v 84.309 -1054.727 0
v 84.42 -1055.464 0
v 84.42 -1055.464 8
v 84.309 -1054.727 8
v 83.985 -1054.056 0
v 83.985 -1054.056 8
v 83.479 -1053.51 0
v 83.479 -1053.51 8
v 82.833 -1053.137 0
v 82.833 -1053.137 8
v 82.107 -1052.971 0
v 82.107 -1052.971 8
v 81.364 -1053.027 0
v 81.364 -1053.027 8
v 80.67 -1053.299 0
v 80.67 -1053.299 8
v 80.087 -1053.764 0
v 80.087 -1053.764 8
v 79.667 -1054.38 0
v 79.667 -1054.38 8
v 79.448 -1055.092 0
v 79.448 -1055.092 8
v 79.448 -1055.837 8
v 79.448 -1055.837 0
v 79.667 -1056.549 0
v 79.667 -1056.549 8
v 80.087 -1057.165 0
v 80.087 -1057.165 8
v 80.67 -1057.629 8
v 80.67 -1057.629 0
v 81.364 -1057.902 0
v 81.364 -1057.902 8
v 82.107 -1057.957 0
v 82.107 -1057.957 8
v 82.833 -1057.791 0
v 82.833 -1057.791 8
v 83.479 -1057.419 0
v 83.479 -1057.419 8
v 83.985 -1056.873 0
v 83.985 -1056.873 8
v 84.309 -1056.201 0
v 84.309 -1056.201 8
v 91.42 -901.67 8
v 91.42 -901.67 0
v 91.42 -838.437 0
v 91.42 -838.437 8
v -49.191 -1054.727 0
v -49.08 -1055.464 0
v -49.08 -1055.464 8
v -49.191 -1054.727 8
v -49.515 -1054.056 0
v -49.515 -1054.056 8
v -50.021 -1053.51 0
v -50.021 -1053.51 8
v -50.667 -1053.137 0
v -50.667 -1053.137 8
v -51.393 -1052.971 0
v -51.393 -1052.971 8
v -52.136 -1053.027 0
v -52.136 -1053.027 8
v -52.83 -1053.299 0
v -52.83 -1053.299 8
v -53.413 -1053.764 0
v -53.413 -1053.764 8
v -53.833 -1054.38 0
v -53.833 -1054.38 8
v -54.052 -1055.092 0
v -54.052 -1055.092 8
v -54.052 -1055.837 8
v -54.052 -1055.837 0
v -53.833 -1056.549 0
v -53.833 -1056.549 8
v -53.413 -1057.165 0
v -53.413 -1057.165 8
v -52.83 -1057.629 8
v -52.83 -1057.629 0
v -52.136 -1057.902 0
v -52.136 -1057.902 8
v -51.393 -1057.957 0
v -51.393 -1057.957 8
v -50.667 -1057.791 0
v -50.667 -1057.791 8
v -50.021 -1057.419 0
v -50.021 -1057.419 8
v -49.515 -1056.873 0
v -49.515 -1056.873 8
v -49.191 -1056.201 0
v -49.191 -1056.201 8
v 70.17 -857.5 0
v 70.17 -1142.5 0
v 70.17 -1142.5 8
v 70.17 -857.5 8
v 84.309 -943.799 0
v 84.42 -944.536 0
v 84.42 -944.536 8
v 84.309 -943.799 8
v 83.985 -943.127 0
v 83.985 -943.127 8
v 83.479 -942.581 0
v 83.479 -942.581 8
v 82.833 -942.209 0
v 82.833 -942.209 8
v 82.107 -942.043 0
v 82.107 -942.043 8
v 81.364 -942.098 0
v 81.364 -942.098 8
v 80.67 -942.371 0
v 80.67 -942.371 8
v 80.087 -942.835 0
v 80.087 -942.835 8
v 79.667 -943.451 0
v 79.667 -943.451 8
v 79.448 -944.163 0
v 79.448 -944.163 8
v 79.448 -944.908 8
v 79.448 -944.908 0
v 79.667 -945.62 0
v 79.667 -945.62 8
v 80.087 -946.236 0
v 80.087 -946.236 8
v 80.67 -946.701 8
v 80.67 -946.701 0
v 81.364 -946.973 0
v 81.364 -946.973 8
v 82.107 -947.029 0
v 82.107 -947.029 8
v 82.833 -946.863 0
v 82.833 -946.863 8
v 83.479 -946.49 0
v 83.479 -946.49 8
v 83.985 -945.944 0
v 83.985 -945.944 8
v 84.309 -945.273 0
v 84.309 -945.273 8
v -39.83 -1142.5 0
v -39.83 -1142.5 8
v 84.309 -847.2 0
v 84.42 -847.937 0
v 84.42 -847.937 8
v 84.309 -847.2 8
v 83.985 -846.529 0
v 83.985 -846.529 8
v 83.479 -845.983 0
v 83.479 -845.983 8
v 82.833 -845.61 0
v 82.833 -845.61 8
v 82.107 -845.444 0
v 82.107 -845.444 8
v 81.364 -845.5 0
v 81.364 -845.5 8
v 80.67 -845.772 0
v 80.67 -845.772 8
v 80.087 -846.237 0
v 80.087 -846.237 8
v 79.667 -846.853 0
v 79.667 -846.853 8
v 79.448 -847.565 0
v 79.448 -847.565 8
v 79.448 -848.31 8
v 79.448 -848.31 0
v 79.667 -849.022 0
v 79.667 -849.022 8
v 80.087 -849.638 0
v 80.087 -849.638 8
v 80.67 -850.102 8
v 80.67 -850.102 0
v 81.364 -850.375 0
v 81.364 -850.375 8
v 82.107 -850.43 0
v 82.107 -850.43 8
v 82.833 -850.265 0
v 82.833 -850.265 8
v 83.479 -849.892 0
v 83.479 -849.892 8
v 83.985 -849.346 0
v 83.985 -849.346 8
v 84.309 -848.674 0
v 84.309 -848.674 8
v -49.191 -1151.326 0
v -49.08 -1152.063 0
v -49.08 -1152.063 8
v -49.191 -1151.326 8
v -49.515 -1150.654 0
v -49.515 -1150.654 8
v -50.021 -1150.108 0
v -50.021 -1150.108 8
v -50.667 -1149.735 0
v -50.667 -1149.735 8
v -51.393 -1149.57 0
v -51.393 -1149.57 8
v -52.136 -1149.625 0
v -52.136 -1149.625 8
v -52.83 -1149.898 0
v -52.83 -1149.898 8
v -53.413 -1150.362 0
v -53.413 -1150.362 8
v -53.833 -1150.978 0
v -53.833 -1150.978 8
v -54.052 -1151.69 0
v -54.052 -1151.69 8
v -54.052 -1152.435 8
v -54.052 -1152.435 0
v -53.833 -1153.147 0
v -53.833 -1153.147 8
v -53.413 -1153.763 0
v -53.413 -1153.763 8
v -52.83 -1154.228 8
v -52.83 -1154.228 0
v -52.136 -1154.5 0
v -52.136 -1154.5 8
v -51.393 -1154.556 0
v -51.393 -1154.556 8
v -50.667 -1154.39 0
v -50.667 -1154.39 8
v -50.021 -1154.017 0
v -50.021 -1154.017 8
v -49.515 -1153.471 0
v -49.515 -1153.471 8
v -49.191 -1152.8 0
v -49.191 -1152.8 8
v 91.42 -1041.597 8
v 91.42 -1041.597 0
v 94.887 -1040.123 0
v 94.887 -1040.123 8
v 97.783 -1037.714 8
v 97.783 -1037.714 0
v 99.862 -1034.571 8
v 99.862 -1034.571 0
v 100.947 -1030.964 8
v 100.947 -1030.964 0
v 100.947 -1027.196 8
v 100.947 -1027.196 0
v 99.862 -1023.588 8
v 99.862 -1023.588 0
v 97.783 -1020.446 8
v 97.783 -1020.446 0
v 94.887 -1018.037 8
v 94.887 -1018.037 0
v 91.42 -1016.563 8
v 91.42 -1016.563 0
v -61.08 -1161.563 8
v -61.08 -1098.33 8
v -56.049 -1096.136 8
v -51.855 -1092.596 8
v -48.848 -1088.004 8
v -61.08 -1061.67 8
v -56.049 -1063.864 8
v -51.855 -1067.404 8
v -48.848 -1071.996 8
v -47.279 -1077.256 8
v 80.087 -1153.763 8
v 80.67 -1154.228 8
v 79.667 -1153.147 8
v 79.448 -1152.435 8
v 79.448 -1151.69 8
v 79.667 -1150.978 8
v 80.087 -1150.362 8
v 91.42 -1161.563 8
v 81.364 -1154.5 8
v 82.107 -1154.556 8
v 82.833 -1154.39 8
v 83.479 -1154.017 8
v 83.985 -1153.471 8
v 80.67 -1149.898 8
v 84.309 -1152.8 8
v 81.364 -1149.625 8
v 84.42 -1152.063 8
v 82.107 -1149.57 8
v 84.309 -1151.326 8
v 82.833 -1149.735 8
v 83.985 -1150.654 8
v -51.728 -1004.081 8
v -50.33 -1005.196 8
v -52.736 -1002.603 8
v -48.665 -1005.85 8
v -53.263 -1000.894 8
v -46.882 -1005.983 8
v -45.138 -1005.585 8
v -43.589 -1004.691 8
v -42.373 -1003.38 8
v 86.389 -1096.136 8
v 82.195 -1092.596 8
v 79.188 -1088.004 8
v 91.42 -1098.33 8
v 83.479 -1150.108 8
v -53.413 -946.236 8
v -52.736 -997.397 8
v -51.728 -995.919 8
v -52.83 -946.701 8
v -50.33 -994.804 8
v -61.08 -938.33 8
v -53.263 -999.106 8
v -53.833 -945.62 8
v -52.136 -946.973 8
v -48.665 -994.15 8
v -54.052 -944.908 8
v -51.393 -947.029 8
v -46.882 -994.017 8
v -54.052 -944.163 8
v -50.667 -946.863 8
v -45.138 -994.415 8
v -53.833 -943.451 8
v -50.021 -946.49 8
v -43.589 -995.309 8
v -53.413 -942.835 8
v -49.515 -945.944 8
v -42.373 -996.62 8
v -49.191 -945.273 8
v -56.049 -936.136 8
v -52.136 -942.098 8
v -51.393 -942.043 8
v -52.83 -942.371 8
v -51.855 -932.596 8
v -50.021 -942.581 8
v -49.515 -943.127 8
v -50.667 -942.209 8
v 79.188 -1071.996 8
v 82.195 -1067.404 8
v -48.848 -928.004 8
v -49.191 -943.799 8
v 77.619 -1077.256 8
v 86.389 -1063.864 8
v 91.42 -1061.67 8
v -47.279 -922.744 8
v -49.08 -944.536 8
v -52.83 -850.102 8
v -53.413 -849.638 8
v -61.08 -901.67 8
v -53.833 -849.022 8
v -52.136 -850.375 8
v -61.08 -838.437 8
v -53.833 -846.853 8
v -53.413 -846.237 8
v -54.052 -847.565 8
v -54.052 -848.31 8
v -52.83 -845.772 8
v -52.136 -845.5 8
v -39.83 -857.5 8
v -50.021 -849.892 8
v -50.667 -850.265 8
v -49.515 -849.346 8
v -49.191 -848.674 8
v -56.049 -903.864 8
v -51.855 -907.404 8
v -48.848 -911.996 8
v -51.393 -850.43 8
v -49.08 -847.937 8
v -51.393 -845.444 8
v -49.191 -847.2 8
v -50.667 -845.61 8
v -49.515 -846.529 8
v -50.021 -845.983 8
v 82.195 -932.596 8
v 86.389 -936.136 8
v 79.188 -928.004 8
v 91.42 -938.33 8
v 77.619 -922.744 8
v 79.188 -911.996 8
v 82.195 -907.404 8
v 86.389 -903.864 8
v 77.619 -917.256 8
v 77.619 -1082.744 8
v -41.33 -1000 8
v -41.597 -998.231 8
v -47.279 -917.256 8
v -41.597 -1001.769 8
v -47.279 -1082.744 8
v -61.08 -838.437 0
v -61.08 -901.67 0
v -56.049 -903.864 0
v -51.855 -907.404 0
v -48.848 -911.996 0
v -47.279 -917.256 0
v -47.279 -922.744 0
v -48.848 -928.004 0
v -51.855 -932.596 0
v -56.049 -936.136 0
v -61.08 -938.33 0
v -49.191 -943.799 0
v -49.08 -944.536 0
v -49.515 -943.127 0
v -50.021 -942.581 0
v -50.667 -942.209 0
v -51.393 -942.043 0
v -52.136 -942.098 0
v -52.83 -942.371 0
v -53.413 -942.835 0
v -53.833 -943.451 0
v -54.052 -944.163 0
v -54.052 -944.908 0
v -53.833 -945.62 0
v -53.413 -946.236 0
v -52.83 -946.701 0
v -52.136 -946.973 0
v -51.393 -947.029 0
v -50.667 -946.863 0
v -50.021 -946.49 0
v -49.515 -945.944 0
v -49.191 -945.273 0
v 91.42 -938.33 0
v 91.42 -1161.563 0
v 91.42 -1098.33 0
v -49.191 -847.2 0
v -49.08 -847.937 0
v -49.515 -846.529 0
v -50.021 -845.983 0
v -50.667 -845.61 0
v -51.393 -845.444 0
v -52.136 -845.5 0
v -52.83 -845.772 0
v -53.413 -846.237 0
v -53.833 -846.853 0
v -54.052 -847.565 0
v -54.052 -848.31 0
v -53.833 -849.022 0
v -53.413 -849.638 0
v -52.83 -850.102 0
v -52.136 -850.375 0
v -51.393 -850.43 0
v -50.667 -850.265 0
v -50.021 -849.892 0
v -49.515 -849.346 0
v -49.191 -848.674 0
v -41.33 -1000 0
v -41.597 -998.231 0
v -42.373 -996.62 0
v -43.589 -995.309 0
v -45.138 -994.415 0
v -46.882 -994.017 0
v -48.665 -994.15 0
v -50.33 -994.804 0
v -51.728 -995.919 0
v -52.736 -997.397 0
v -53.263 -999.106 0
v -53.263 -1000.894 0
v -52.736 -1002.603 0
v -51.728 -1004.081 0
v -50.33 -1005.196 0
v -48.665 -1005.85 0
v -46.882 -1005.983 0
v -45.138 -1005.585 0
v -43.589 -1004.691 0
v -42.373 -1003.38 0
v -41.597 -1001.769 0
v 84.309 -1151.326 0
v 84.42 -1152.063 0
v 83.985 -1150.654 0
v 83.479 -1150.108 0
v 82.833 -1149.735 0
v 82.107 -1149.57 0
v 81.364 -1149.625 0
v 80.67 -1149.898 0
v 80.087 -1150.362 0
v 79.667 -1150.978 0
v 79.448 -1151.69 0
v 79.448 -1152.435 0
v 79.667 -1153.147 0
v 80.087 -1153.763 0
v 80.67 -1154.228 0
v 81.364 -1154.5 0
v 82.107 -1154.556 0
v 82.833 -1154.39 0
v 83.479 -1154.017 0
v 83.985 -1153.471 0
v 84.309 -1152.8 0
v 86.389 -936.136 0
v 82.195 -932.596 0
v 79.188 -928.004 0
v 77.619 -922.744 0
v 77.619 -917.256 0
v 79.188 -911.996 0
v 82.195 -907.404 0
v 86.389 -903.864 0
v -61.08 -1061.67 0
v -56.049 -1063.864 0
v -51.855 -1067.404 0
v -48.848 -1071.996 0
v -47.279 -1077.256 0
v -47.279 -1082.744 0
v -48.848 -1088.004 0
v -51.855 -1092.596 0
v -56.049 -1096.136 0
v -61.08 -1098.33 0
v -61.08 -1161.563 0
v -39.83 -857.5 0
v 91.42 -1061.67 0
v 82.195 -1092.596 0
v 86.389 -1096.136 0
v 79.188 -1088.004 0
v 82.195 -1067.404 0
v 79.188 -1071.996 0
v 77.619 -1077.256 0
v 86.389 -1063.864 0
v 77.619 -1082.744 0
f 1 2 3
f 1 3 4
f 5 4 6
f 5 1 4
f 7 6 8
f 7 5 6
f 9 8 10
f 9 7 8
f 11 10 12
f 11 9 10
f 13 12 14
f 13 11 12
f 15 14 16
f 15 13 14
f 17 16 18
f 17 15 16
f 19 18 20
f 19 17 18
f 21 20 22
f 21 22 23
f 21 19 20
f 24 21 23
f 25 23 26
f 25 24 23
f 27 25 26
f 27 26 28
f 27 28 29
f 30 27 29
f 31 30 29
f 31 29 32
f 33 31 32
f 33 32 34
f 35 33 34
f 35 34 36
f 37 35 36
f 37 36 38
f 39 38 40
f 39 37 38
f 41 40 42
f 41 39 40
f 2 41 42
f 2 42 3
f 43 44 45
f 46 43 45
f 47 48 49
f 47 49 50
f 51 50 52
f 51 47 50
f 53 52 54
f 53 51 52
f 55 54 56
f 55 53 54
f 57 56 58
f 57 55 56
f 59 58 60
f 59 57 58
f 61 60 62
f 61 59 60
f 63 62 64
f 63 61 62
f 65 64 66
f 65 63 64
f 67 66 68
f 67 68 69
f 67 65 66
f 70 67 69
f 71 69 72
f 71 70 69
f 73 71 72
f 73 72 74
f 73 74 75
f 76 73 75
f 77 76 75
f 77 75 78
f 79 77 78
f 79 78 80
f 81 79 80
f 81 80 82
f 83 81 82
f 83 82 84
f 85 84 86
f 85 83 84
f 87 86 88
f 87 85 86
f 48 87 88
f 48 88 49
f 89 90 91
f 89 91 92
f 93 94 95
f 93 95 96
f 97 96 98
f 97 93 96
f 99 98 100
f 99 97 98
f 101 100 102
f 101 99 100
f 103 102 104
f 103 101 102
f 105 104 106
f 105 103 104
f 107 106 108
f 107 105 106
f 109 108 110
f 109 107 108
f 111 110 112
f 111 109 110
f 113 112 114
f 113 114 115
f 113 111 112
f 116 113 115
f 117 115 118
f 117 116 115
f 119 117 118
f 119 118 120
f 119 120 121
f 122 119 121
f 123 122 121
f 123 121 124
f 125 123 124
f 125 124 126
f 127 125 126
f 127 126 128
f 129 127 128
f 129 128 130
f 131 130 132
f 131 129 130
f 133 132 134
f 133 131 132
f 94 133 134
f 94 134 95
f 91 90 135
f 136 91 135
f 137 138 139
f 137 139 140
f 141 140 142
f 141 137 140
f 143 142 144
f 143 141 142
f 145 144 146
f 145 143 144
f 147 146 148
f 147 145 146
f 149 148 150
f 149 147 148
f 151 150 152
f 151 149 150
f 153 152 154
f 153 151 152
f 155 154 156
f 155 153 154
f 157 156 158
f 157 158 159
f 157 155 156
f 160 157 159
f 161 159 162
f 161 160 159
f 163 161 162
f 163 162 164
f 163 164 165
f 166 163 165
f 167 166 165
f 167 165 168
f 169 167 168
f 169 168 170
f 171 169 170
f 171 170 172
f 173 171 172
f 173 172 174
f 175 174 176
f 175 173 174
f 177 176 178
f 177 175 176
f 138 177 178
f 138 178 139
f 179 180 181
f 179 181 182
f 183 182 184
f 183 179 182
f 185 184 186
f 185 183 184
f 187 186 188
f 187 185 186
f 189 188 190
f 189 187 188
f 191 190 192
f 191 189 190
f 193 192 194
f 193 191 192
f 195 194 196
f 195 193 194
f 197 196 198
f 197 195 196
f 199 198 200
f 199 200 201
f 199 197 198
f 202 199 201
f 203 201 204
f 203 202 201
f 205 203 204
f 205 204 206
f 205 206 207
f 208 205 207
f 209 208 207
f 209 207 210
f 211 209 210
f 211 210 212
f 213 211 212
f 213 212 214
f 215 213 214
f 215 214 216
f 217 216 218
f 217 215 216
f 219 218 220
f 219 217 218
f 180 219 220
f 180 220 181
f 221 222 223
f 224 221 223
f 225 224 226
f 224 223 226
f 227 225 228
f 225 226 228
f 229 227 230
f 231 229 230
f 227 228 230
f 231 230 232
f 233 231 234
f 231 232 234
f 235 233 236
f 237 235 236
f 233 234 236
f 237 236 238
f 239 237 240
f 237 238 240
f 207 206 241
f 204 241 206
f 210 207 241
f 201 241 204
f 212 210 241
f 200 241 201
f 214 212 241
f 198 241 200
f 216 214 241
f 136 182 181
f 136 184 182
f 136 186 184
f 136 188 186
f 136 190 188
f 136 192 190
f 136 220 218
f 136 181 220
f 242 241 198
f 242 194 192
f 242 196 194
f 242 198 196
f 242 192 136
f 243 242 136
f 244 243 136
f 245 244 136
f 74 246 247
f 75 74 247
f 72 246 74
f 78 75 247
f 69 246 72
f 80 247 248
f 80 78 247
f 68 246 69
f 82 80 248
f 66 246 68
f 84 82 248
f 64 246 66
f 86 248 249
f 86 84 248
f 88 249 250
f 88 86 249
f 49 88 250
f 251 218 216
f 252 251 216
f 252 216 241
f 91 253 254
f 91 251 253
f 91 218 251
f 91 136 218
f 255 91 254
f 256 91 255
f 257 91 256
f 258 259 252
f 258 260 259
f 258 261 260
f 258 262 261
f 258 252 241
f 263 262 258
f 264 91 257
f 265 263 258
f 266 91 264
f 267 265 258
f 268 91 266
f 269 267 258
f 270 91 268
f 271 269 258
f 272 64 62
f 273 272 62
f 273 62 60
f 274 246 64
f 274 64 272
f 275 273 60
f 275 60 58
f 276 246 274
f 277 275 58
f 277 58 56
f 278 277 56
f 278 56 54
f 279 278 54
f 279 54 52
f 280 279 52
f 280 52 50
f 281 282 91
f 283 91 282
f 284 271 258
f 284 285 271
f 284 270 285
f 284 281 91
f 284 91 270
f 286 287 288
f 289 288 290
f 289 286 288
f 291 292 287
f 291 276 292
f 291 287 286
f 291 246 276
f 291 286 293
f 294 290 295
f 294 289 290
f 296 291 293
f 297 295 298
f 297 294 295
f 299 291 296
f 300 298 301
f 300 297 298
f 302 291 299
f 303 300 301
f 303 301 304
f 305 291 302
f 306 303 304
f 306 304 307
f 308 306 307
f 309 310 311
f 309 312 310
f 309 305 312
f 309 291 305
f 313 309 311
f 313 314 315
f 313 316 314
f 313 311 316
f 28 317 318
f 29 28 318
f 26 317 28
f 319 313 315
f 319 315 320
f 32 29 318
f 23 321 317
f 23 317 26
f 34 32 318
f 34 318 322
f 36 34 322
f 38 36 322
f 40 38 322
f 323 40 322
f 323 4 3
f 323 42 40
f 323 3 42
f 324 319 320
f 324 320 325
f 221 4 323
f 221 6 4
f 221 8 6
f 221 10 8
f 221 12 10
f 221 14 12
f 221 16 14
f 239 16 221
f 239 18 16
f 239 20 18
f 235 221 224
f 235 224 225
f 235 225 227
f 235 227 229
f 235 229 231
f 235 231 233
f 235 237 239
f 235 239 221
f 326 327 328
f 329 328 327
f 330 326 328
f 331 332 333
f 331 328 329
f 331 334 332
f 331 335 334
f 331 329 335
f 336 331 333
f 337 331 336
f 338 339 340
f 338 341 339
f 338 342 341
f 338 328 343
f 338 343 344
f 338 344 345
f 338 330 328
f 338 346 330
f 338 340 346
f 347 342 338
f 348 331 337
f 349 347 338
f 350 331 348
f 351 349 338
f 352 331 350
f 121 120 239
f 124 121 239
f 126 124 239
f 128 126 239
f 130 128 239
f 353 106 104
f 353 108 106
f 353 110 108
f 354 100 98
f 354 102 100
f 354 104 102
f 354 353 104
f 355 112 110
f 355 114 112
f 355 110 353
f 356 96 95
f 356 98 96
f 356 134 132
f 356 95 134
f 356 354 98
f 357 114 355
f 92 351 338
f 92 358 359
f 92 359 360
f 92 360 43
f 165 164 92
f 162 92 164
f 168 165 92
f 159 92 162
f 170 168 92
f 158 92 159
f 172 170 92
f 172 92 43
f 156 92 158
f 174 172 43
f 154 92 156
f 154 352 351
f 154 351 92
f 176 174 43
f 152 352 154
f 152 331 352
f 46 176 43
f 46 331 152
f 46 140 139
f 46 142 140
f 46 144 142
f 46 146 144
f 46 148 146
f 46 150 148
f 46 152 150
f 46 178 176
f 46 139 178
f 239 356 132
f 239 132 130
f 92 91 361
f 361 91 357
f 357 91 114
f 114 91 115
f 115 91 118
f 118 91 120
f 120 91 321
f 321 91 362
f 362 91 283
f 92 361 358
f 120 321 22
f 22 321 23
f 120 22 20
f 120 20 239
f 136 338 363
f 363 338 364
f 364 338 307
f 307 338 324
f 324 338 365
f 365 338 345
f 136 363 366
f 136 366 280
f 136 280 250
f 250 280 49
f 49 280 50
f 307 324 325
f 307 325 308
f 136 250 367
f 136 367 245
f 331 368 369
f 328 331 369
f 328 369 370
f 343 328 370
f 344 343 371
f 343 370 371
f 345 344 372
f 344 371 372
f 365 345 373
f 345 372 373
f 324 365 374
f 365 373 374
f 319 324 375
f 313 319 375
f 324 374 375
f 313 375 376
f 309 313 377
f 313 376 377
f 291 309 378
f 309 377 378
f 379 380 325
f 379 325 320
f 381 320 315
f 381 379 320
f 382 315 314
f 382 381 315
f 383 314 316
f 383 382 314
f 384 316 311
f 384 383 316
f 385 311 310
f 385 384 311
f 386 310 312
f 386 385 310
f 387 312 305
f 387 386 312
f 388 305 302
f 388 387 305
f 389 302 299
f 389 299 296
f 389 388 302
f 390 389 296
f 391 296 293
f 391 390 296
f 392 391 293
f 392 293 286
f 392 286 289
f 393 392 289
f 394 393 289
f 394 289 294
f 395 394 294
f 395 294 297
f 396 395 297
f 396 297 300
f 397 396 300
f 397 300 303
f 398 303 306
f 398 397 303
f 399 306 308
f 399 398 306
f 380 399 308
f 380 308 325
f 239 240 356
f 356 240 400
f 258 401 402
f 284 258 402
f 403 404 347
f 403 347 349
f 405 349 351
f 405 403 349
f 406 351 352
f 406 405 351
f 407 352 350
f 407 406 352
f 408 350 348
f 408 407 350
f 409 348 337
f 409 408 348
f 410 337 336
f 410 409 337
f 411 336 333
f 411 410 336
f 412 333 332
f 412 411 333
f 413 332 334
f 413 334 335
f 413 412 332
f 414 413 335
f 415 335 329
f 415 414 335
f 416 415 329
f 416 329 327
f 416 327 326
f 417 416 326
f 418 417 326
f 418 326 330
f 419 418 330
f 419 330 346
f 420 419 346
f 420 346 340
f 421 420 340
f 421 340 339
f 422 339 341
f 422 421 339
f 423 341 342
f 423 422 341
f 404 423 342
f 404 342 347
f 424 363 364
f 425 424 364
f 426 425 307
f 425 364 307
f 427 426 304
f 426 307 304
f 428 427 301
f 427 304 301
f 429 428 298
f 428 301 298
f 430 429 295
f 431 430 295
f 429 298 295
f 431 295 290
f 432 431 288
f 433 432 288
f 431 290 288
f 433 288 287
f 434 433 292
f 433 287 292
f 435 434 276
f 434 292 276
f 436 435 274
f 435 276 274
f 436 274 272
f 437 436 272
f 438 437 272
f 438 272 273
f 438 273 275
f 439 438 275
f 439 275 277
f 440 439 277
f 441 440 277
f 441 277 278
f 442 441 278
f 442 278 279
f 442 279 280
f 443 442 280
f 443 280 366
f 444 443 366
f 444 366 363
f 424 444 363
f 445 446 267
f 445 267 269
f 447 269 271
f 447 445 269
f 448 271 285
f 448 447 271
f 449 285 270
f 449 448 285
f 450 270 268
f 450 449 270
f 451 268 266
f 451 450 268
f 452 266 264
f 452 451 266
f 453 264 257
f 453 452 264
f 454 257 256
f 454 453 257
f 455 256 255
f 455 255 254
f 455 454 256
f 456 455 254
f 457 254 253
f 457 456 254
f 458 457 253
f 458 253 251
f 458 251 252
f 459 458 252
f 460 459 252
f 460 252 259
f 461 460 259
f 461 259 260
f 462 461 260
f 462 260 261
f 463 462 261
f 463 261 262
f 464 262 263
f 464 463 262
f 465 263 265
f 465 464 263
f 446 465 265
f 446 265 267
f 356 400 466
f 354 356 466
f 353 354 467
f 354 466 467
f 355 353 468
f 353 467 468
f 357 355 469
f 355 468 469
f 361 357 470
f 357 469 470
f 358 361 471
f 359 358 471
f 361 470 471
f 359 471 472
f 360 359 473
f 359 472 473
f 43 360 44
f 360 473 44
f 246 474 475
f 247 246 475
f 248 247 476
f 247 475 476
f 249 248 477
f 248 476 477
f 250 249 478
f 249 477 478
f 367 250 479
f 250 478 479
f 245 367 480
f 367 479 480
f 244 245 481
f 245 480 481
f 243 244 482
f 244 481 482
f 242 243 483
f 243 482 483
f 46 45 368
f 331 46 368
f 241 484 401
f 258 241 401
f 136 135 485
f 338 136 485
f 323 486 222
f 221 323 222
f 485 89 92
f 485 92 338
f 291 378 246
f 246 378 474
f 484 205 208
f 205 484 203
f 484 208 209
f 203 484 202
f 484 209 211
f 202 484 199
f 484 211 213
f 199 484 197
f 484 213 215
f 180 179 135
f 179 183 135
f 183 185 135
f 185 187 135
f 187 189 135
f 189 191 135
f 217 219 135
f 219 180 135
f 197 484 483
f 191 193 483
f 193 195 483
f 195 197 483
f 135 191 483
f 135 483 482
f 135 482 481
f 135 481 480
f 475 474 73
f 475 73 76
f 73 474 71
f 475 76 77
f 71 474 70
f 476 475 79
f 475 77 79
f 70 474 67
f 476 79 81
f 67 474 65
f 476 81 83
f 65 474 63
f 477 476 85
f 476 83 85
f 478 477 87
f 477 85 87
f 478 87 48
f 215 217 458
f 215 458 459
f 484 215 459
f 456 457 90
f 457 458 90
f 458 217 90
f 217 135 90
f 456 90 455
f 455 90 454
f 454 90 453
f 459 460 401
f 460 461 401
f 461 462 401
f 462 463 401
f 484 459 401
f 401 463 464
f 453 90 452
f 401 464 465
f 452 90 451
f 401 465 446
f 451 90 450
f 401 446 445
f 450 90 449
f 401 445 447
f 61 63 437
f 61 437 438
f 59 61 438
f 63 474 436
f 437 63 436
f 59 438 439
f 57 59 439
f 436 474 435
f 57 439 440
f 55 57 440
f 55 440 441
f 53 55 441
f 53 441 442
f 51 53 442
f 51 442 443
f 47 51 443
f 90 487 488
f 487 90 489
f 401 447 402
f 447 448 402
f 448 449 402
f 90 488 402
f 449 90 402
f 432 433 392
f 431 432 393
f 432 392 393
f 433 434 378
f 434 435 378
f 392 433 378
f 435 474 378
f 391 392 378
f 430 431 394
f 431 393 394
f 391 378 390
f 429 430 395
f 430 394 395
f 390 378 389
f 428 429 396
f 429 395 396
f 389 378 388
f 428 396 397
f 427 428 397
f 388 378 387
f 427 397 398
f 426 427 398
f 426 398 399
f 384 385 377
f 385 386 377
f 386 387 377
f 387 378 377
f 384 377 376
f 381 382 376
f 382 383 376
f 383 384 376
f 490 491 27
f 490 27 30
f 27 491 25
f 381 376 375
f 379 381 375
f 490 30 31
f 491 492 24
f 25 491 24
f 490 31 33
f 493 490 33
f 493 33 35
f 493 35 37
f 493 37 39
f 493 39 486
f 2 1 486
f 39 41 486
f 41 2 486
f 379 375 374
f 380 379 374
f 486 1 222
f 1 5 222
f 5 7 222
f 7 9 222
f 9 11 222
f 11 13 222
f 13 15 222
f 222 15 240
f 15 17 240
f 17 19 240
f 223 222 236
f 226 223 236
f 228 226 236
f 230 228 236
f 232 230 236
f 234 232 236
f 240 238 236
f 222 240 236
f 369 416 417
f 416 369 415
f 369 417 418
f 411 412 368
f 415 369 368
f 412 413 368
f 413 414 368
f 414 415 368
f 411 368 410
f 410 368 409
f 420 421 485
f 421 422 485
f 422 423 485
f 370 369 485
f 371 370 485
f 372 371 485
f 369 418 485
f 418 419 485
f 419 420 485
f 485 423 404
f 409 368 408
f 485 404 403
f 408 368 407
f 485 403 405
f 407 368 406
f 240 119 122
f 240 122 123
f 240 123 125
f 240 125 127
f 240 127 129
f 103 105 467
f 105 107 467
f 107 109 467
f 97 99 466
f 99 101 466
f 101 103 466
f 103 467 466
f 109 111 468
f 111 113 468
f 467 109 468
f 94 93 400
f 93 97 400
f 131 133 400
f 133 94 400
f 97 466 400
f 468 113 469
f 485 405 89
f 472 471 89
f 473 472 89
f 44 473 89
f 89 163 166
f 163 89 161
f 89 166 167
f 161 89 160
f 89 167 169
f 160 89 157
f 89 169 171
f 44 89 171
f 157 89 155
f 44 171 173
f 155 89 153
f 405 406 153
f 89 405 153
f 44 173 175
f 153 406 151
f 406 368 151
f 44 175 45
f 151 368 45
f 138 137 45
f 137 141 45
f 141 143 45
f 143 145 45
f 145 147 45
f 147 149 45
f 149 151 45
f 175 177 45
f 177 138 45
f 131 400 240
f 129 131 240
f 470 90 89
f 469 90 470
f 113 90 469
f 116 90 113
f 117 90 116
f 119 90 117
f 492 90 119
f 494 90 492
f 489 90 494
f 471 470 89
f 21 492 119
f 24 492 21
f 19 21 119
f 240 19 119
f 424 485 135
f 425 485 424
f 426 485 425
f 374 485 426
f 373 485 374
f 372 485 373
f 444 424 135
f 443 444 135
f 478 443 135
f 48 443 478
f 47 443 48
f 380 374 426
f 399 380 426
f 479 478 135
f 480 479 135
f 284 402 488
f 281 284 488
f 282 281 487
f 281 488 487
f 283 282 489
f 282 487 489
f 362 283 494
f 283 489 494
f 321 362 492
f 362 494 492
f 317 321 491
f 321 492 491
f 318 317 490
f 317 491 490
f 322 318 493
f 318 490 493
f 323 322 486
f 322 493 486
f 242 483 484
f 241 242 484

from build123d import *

# Parameters (mm, degrees)
SKETCH1_R           = 2.5
BOSS_EXTRUDE1_DEPTH = 8
SKETCH5_W           = 110
SKETCH5_H           = 285
CUT_EXTRUDE4_DEPTH  = 9
SKETCH6_R           = 6
CUT_EXTRUDE5_DEPTH  = 9


with BuildPart() as part:
    # Sketch1 → Boss-Extrude1 (new body)
    with BuildSketch(Plane.XY):
        with BuildLine():
            Line((-61.080112923, -938.33030278), (-61.080112923, -1061.66969722))
            ThreePointArc((-61.080112923, -1061.66969722), (-47.080112923, -1080), (-61.080112923, -1098.33030278))
            Line((-61.080112923, -1098.33030278), (-61.080112923, -1161.56262))
            Line((-61.080112923, -1161.56262), (91.419887077, -1161.56262))
            Line((91.419887077, -1161.56262), (91.419887077, -1098.33030278))
            ThreePointArc((91.419887077, -1098.33030278), (77.419887077, -1080), (91.419887077, -1061.66969722))
            Line((91.419887077, -1061.66969722), (91.419887077, -1041.596868336))
            ThreePointArc((91.419887077, -1041.596868336), (101.085308187, -1029.0799835), (91.419887077, -1016.563098664))
            Line((91.419887077, -1016.563098664), (91.419887077, -938.33030278))
            ThreePointArc((91.419887077, -938.33030278), (77.419887077, -920), (91.419887077, -901.66969722))
            Line((91.419887077, -901.66969722), (91.419887077, -838.43738))
            Line((91.419887077, -838.43738), (-61.080112923, -838.43738))
            Line((-61.080112923, -838.43738), (-61.080112923, -901.66969722))
            ThreePointArc((-61.080112923, -901.66969722), (-47.080112923, -920), (-61.080112923, -938.33030278))
        make_face()
        with Locations((-51.580112923, -847.93738)):
            Circle(SKETCH1_R, mode=Mode.SUBTRACT)
        with Locations((81.919887077, -847.93738)):
            Circle(SKETCH1_R, mode=Mode.SUBTRACT)
        with Locations((81.919887077, -944.535688293)):
            Circle(SKETCH1_R, mode=Mode.SUBTRACT)
        with Locations((-51.580112923, -944.535688293)):
            Circle(SKETCH1_R, mode=Mode.SUBTRACT)
        with Locations((-51.580112923, -1055.464311707)):
            Circle(SKETCH1_R, mode=Mode.SUBTRACT)
        with Locations((81.919887077, -1055.464311707)):
            Circle(SKETCH1_R, mode=Mode.SUBTRACT)
        with Locations((81.919887077, -1152.06262)):
            Circle(SKETCH1_R, mode=Mode.SUBTRACT)
        with Locations((-51.580112923, -1152.06262)):
            Circle(SKETCH1_R, mode=Mode.SUBTRACT)
    extrude(amount=BOSS_EXTRUDE1_DEPTH)

    # Sketch5 → Cut-Extrude4 (cut, through all)
    with BuildSketch(Plane(origin=(0, 0, 0), x_dir=(-1, 0, 0), z_dir=(0, 0, -1))):
        with Locations((-15.169887077, -1000)):
            Rectangle(SKETCH5_W, SKETCH5_H)
    extrude(amount=-CUT_EXTRUDE4_DEPTH, mode=Mode.SUBTRACT)

    # Sketch6 → Cut-Extrude5 (cut, through all)
    with BuildSketch(Plane.XY.offset(8)):
        with Locations((-47.330112923, -1000)):
            Circle(SKETCH6_R)
    extrude(amount=-CUT_EXTRUDE5_DEPTH, mode=Mode.SUBTRACT)


solid = part.part
